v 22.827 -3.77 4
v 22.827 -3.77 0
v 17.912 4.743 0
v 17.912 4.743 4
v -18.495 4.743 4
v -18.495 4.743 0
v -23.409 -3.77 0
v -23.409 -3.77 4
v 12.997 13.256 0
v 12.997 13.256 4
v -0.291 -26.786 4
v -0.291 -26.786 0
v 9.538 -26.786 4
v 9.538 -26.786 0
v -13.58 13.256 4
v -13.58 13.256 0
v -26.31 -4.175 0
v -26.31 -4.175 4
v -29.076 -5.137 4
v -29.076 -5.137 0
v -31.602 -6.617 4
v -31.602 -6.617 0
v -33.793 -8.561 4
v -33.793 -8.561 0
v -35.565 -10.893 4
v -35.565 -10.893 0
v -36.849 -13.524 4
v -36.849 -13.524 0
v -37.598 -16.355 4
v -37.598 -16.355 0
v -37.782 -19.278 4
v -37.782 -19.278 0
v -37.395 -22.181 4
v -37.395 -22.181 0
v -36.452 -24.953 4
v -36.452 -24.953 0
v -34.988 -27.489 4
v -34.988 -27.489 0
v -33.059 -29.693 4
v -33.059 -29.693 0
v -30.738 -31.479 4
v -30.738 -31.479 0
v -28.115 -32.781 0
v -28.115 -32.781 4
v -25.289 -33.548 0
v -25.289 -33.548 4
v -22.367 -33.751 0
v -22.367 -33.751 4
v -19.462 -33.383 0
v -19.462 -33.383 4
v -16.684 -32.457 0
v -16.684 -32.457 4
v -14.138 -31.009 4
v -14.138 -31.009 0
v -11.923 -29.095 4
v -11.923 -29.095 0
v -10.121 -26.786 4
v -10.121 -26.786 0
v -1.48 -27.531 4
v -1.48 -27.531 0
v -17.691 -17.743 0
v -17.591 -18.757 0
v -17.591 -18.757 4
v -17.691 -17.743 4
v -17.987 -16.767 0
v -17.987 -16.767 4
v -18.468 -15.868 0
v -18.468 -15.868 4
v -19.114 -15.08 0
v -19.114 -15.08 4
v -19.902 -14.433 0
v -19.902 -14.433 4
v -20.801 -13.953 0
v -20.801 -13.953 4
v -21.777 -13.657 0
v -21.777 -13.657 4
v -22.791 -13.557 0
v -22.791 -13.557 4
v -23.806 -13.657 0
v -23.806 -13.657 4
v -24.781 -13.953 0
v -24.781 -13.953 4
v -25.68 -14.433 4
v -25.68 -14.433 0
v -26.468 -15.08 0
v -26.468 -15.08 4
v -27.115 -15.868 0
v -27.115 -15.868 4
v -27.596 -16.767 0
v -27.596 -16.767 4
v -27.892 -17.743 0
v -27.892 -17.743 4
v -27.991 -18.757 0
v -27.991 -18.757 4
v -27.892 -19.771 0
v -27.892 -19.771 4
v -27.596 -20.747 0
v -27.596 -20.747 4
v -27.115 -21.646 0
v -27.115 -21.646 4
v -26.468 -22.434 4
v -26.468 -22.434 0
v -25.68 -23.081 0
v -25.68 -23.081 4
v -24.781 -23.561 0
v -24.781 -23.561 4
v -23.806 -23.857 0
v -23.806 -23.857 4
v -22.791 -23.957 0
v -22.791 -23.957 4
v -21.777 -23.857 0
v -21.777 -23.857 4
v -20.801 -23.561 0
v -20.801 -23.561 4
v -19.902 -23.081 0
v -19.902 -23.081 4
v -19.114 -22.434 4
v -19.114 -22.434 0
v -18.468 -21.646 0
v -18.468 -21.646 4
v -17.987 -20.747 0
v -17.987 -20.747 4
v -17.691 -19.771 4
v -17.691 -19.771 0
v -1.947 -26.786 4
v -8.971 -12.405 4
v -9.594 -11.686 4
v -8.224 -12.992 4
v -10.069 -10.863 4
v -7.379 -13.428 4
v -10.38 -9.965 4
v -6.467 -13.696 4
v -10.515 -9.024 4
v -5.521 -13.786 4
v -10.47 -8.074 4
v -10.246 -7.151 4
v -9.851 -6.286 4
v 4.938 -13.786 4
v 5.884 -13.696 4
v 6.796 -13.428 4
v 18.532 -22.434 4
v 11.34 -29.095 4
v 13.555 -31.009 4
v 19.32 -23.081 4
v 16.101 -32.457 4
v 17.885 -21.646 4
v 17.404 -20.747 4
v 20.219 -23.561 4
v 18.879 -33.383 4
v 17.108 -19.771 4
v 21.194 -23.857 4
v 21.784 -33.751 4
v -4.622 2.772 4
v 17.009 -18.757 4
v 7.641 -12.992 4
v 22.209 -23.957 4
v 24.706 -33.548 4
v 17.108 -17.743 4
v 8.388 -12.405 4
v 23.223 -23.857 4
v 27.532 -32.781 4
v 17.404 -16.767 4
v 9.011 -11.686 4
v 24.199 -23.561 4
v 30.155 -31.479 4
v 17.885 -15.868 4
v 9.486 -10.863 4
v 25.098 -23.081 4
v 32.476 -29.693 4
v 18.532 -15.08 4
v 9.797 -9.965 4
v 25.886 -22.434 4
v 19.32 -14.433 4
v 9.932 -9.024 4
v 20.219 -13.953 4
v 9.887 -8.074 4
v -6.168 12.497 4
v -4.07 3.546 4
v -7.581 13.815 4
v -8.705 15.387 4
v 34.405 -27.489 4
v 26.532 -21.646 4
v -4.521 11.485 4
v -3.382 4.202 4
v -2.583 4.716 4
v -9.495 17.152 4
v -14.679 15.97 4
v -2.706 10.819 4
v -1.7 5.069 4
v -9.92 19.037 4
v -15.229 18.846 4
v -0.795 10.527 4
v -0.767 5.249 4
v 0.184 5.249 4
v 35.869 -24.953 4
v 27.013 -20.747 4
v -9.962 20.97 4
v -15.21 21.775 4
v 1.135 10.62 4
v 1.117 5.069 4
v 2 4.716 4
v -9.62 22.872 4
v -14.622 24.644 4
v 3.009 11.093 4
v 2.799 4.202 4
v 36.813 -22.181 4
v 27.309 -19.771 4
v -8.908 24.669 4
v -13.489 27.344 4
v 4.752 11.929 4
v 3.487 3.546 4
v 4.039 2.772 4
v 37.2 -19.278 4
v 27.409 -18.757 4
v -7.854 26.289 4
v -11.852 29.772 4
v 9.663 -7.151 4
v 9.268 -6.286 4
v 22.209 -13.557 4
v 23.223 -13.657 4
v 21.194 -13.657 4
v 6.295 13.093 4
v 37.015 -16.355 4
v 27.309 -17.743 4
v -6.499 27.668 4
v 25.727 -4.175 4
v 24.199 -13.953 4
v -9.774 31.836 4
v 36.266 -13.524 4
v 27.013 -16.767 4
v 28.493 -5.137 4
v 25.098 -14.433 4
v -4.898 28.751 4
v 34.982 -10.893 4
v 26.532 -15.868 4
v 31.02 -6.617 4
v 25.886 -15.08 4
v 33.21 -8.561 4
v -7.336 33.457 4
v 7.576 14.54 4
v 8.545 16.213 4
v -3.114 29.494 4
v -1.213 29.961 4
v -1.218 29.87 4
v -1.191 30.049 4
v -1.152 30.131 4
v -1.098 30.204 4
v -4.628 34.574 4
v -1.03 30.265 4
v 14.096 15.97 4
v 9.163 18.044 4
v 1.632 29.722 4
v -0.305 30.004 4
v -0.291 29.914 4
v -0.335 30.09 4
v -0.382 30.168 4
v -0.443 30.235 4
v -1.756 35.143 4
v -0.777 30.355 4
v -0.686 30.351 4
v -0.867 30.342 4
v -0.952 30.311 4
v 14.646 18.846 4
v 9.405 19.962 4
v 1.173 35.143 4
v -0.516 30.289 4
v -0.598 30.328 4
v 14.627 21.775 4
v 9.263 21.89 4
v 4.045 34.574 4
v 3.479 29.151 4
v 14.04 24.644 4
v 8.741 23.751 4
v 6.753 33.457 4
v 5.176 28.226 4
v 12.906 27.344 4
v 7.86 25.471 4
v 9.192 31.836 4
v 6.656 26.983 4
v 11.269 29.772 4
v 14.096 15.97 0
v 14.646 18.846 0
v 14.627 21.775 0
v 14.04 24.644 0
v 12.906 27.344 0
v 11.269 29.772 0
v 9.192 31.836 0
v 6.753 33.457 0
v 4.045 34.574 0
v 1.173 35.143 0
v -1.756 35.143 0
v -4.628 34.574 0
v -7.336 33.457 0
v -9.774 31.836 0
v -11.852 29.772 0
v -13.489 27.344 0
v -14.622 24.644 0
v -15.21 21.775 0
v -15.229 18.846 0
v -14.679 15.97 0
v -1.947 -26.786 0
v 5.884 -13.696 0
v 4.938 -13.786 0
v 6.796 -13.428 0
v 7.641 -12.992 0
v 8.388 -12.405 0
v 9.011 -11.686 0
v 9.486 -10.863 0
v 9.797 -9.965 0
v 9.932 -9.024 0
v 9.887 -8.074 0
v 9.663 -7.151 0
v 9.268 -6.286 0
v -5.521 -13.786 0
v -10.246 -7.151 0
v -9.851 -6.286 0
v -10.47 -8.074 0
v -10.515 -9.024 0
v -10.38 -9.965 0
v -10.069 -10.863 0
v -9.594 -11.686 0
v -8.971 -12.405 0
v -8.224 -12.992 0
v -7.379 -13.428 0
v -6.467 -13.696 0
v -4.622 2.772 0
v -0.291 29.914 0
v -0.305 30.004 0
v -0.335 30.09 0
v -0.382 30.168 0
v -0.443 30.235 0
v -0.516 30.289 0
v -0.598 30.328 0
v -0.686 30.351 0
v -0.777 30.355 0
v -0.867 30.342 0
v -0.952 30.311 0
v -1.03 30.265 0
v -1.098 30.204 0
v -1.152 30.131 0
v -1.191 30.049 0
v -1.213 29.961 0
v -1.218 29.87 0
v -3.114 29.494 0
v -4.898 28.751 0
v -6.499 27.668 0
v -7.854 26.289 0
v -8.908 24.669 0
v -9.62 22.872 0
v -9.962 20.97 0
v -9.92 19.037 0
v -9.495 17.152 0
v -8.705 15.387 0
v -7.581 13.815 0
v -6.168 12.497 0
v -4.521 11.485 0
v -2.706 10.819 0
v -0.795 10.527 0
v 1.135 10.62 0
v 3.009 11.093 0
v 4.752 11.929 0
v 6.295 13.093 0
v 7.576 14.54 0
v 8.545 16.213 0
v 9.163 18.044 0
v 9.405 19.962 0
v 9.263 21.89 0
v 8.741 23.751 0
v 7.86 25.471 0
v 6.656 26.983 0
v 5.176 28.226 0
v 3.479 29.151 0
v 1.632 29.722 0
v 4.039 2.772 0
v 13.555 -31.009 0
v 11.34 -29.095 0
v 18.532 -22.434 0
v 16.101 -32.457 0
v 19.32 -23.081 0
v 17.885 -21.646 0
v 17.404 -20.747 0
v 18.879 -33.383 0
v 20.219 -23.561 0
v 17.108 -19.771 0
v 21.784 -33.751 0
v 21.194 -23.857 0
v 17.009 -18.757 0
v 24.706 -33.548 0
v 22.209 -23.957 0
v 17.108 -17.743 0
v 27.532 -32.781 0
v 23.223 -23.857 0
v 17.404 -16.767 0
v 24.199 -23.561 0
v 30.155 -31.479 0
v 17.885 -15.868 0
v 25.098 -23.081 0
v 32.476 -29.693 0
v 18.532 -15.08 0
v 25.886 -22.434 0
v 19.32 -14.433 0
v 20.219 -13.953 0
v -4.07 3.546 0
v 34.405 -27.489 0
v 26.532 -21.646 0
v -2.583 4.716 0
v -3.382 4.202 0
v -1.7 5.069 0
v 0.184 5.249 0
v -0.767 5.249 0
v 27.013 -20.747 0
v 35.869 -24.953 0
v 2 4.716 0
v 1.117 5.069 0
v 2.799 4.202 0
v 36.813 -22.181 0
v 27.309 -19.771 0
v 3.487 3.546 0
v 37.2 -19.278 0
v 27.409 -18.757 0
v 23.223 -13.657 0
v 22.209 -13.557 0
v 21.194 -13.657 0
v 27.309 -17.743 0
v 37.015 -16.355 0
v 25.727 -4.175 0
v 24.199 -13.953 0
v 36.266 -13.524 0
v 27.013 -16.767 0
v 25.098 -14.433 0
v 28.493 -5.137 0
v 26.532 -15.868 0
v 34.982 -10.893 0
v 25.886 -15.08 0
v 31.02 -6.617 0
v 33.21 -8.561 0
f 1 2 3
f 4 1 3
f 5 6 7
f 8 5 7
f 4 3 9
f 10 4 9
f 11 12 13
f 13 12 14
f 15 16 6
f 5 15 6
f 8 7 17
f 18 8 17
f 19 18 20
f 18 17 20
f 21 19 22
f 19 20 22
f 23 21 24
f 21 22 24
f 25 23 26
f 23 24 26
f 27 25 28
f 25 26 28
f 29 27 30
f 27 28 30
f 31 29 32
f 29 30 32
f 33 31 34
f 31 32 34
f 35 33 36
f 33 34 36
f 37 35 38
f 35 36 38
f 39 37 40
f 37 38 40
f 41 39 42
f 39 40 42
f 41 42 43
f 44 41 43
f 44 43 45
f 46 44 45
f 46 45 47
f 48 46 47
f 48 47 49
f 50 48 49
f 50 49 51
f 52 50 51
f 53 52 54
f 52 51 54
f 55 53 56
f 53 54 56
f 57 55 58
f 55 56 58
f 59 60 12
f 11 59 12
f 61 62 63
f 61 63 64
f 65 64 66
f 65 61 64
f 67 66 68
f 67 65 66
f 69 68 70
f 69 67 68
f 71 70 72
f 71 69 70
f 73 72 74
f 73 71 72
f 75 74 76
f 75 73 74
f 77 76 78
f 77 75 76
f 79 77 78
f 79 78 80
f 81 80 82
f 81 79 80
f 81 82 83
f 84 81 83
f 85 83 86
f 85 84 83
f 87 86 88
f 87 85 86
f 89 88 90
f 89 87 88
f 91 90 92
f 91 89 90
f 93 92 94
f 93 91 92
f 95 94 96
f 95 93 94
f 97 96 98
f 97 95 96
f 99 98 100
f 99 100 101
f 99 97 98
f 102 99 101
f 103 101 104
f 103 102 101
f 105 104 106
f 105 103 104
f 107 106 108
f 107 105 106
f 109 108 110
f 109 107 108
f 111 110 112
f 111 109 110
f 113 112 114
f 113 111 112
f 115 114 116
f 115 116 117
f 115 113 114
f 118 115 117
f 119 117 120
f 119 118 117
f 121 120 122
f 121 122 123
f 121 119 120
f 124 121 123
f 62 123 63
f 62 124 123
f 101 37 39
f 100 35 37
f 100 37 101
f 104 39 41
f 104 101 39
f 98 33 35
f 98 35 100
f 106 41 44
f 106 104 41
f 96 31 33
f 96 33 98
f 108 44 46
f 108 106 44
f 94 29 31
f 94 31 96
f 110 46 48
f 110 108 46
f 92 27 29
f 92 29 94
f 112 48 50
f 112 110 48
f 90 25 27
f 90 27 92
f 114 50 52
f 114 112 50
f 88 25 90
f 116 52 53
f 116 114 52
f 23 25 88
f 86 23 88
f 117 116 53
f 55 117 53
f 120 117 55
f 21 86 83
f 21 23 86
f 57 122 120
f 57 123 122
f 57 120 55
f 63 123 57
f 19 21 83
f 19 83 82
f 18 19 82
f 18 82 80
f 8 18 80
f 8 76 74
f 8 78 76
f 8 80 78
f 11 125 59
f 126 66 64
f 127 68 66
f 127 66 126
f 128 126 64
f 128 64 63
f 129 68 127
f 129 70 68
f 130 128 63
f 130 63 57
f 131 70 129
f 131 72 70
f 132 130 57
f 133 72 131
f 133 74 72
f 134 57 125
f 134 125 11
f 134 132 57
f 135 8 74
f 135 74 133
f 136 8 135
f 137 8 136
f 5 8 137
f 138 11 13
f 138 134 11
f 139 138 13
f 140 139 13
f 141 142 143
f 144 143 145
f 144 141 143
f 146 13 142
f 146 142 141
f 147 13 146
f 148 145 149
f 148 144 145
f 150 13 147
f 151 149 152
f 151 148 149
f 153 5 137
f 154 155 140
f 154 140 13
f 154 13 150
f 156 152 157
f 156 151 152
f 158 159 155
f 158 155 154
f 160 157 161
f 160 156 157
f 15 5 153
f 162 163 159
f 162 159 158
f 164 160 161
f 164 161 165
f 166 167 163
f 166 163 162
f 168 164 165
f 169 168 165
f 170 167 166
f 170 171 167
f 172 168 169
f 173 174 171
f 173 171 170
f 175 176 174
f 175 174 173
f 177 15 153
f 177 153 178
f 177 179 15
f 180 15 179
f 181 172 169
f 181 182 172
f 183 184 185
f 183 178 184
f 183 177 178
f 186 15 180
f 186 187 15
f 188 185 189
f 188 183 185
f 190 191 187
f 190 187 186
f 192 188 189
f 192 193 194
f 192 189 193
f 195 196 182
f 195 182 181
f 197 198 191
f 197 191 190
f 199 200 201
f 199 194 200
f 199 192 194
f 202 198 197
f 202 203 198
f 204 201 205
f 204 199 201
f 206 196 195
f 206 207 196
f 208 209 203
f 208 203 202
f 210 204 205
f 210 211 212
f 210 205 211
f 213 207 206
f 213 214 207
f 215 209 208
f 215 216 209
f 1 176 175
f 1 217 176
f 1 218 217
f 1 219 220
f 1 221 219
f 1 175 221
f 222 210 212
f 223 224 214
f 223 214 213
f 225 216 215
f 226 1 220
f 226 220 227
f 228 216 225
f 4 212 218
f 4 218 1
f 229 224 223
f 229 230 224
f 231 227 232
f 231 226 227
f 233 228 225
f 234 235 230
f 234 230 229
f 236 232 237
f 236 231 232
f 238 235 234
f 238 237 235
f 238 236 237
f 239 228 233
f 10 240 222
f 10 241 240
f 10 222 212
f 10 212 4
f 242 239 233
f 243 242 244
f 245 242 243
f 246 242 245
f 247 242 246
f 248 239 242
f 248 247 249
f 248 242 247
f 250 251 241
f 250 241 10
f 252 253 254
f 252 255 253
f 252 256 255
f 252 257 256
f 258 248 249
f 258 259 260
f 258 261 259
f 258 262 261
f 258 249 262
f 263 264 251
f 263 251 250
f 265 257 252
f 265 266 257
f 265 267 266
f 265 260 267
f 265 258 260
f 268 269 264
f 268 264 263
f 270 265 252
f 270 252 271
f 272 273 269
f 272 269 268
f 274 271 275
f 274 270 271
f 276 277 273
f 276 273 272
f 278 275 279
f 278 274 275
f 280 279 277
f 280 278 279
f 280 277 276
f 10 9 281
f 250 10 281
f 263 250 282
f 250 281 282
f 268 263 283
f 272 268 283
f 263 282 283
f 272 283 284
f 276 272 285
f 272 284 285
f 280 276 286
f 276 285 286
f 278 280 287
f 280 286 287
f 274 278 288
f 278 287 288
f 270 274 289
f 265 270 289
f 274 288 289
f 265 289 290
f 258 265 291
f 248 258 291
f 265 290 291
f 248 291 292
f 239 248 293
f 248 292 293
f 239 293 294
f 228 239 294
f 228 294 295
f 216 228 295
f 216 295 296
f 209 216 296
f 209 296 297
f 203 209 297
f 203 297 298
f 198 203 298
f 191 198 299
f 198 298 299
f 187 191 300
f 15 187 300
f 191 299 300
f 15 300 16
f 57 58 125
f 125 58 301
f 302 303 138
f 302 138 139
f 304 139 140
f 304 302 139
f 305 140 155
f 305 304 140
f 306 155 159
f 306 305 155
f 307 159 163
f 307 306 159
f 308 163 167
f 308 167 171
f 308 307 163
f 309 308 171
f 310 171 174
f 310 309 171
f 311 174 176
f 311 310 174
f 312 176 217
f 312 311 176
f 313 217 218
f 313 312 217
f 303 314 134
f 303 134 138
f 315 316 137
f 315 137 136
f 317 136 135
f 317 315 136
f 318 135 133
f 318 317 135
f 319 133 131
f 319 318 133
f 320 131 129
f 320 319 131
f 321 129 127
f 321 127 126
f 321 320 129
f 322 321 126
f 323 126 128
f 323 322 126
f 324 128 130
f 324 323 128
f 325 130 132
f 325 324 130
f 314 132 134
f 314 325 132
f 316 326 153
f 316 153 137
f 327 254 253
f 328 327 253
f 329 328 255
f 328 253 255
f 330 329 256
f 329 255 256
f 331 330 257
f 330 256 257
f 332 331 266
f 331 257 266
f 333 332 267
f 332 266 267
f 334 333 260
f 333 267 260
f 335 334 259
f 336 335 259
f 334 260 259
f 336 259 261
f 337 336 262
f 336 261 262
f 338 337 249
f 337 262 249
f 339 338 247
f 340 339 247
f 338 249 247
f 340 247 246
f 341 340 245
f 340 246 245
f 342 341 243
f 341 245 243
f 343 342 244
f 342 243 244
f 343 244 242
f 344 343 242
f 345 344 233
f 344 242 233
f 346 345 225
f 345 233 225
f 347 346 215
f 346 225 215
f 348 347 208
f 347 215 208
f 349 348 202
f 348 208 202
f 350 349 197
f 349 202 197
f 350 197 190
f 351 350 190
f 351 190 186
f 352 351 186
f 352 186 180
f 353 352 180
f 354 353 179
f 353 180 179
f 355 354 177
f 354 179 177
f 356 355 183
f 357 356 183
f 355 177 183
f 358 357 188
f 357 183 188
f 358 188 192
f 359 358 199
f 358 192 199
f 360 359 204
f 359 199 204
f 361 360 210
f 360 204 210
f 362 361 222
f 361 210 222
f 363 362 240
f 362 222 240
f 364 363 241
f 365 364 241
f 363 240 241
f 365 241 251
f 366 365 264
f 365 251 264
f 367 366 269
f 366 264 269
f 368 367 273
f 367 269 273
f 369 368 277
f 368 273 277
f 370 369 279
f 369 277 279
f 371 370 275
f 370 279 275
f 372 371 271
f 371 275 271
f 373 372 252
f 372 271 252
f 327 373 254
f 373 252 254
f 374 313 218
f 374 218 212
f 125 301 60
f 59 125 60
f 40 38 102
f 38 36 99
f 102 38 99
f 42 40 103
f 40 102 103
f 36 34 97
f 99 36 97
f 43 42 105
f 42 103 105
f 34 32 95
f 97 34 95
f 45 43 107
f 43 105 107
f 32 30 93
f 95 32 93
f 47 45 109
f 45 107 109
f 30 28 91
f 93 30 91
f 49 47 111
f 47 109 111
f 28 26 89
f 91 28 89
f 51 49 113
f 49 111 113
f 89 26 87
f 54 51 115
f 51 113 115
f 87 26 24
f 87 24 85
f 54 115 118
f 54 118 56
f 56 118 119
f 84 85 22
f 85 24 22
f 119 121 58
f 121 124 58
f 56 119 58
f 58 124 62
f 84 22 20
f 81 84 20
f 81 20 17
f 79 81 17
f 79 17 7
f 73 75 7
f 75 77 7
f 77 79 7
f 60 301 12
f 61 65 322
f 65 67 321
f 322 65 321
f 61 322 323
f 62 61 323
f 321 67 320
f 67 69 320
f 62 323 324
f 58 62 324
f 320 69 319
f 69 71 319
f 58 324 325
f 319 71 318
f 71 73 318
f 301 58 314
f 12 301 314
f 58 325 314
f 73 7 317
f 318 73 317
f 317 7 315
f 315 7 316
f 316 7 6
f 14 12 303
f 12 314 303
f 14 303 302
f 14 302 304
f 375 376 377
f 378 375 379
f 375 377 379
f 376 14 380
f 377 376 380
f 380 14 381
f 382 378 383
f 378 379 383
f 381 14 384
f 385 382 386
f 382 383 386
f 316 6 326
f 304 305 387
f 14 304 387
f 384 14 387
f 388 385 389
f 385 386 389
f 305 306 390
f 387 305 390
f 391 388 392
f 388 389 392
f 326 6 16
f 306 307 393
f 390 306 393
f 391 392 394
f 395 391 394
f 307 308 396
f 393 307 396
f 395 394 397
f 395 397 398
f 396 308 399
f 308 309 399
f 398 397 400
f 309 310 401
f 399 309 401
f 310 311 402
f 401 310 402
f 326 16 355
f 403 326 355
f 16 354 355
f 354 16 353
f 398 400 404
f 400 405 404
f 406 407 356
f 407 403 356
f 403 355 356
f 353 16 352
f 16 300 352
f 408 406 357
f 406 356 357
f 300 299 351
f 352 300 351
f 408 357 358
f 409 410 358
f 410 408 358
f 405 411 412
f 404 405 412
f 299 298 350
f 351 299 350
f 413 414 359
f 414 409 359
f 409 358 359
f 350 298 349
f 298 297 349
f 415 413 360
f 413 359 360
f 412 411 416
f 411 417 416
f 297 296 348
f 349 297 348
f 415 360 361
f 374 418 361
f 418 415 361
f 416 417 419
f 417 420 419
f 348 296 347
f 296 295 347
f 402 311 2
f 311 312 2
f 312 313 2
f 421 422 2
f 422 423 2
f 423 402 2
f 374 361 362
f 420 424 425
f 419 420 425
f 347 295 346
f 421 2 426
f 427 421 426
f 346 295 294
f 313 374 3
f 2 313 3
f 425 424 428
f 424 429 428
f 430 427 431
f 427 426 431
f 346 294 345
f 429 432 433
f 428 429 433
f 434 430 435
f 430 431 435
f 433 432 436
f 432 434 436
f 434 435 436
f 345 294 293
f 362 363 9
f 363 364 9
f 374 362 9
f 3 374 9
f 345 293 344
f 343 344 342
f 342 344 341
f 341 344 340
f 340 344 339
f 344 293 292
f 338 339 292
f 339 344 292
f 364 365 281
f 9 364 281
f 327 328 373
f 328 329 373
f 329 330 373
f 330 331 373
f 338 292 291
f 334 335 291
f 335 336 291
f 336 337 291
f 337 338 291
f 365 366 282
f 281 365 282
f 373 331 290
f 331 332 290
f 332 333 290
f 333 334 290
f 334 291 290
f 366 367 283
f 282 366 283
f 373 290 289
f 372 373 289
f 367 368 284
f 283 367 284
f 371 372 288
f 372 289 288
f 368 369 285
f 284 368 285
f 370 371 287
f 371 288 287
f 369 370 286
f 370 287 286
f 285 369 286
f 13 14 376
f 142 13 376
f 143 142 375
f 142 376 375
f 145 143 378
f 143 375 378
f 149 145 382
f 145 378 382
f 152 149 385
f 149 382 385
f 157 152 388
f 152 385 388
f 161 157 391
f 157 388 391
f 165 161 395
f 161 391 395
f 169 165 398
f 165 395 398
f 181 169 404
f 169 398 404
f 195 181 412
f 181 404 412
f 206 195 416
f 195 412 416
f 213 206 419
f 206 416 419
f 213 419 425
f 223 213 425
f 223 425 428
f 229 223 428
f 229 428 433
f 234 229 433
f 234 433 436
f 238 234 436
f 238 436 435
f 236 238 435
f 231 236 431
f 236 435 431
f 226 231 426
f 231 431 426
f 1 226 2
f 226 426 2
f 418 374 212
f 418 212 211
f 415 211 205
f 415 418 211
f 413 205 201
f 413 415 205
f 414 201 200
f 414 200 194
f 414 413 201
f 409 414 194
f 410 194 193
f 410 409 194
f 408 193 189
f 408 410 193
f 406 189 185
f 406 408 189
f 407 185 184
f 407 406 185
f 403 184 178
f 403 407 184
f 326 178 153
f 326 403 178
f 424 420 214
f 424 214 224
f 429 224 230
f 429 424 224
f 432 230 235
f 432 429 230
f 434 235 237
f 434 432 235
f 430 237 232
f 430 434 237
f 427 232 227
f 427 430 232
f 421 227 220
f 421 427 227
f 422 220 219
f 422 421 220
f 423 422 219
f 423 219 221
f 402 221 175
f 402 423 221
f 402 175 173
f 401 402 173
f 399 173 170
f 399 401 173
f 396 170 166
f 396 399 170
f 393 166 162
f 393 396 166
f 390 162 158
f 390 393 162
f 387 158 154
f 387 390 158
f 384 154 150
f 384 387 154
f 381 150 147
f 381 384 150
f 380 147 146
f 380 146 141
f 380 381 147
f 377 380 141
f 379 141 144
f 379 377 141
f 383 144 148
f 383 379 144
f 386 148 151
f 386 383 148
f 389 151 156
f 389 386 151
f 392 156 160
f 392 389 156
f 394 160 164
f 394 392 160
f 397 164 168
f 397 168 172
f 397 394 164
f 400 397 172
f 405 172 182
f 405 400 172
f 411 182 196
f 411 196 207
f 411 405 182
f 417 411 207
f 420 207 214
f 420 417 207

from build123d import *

# Parameters (mm, degrees)
SKETCH_1_R          = 5.2
EXTRUDE_1_DEPTH     = 4
CUT_EXTRUDE_1_DEPTH = 4


with BuildPart() as part:
    # 草图1 → 凸台-拉伸1 (new body)
    with BuildSketch(Plane.XY):
        with BuildLine():
            Line((-18.494622549, 4.742999843), (-23.409453688, -3.769737399))
            ThreePointArc((-23.409453688, -3.769737399), (-35.781809628, -26.257000157), (-10.121090849, -26.785856986))
            Line((-10.121090849, -26.785856986), (-1.94731163, -26.785856986))
            Line((-1.94731163, -26.785856986), (-1.47982289, -27.531216606))
            Line((-1.47982289, -27.531216606), (-0.291428571, -26.785856986))
            Line((-0.291428571, -26.785856986), (9.538233706, -26.785856986))
            ThreePointArc((9.538233706, -26.785856986), (35.198952485, -26.257000157), (22.826596545, -3.769737399))
            Line((22.826596545, -3.769737399), (17.911765406, 4.742999843))
            Line((17.911765406, 4.742999843), (12.996934268, 13.255737086))
            ThreePointArc((12.996934268, 13.255737086), (-0.291428571, 35.214143014), (-13.579791411, 13.255737086))
            Line((-13.579791411, 13.255737086), (-18.494622549, 4.742999843))
        make_face()
        with Locations((-0.291428571, 20.214143014)):
            Circle(SKETCH_1_R, mode=Mode.SUBTRACT)
        with Locations((22.208571429, -18.757000157)):
            Circle(SKETCH_1_R, mode=Mode.SUBTRACT)
        with Locations((-22.791428571, -18.757000157)):
            Circle(SKETCH_1_R, mode=Mode.SUBTRACT)
        with BuildLine():
            Line((9.268171867, -6.285856986), (4.038698447, 2.771856673))
            ThreePointArc((4.038698447, 2.771856673), (-0.291428571, 5.271856673), (-4.62155559, 2.771856673))
            Line((-4.62155559, 2.771856673), (-9.85102901, -6.285856986))
            ThreePointArc((-9.85102901, -6.285856986), (-9.85102901, -11.285856986), (-5.520901991, -13.785856986))
            Line((-5.520901991, -13.785856986), (4.938044848, -13.785856986))
            ThreePointArc((4.938044848, -13.785856986), (9.268171867, -11.285856986), (9.268171867, -6.285856986))
        make_face(mode=Mode.SUBTRACT)
    extrude(amount=EXTRUDE_1_DEPTH)

    # 草图2 → 切除-拉伸1 (cut)
    with BuildSketch(Plane.XY.offset(4)):
        with BuildLine():
            ThreePointArc((-0.291428571, 29.914143014), (-0.77677081, 30.355150727), (-1.217778524, 29.869808489))
            ThreePointArc((-1.217778524, 29.869808489), (0.172276557, 10.525232985), (-0.291428571, 29.914143014))
        make_face()
    extrude(amount=-CUT_EXTRUDE_1_DEPTH, mode=Mode.SUBTRACT)


solid = part.part
